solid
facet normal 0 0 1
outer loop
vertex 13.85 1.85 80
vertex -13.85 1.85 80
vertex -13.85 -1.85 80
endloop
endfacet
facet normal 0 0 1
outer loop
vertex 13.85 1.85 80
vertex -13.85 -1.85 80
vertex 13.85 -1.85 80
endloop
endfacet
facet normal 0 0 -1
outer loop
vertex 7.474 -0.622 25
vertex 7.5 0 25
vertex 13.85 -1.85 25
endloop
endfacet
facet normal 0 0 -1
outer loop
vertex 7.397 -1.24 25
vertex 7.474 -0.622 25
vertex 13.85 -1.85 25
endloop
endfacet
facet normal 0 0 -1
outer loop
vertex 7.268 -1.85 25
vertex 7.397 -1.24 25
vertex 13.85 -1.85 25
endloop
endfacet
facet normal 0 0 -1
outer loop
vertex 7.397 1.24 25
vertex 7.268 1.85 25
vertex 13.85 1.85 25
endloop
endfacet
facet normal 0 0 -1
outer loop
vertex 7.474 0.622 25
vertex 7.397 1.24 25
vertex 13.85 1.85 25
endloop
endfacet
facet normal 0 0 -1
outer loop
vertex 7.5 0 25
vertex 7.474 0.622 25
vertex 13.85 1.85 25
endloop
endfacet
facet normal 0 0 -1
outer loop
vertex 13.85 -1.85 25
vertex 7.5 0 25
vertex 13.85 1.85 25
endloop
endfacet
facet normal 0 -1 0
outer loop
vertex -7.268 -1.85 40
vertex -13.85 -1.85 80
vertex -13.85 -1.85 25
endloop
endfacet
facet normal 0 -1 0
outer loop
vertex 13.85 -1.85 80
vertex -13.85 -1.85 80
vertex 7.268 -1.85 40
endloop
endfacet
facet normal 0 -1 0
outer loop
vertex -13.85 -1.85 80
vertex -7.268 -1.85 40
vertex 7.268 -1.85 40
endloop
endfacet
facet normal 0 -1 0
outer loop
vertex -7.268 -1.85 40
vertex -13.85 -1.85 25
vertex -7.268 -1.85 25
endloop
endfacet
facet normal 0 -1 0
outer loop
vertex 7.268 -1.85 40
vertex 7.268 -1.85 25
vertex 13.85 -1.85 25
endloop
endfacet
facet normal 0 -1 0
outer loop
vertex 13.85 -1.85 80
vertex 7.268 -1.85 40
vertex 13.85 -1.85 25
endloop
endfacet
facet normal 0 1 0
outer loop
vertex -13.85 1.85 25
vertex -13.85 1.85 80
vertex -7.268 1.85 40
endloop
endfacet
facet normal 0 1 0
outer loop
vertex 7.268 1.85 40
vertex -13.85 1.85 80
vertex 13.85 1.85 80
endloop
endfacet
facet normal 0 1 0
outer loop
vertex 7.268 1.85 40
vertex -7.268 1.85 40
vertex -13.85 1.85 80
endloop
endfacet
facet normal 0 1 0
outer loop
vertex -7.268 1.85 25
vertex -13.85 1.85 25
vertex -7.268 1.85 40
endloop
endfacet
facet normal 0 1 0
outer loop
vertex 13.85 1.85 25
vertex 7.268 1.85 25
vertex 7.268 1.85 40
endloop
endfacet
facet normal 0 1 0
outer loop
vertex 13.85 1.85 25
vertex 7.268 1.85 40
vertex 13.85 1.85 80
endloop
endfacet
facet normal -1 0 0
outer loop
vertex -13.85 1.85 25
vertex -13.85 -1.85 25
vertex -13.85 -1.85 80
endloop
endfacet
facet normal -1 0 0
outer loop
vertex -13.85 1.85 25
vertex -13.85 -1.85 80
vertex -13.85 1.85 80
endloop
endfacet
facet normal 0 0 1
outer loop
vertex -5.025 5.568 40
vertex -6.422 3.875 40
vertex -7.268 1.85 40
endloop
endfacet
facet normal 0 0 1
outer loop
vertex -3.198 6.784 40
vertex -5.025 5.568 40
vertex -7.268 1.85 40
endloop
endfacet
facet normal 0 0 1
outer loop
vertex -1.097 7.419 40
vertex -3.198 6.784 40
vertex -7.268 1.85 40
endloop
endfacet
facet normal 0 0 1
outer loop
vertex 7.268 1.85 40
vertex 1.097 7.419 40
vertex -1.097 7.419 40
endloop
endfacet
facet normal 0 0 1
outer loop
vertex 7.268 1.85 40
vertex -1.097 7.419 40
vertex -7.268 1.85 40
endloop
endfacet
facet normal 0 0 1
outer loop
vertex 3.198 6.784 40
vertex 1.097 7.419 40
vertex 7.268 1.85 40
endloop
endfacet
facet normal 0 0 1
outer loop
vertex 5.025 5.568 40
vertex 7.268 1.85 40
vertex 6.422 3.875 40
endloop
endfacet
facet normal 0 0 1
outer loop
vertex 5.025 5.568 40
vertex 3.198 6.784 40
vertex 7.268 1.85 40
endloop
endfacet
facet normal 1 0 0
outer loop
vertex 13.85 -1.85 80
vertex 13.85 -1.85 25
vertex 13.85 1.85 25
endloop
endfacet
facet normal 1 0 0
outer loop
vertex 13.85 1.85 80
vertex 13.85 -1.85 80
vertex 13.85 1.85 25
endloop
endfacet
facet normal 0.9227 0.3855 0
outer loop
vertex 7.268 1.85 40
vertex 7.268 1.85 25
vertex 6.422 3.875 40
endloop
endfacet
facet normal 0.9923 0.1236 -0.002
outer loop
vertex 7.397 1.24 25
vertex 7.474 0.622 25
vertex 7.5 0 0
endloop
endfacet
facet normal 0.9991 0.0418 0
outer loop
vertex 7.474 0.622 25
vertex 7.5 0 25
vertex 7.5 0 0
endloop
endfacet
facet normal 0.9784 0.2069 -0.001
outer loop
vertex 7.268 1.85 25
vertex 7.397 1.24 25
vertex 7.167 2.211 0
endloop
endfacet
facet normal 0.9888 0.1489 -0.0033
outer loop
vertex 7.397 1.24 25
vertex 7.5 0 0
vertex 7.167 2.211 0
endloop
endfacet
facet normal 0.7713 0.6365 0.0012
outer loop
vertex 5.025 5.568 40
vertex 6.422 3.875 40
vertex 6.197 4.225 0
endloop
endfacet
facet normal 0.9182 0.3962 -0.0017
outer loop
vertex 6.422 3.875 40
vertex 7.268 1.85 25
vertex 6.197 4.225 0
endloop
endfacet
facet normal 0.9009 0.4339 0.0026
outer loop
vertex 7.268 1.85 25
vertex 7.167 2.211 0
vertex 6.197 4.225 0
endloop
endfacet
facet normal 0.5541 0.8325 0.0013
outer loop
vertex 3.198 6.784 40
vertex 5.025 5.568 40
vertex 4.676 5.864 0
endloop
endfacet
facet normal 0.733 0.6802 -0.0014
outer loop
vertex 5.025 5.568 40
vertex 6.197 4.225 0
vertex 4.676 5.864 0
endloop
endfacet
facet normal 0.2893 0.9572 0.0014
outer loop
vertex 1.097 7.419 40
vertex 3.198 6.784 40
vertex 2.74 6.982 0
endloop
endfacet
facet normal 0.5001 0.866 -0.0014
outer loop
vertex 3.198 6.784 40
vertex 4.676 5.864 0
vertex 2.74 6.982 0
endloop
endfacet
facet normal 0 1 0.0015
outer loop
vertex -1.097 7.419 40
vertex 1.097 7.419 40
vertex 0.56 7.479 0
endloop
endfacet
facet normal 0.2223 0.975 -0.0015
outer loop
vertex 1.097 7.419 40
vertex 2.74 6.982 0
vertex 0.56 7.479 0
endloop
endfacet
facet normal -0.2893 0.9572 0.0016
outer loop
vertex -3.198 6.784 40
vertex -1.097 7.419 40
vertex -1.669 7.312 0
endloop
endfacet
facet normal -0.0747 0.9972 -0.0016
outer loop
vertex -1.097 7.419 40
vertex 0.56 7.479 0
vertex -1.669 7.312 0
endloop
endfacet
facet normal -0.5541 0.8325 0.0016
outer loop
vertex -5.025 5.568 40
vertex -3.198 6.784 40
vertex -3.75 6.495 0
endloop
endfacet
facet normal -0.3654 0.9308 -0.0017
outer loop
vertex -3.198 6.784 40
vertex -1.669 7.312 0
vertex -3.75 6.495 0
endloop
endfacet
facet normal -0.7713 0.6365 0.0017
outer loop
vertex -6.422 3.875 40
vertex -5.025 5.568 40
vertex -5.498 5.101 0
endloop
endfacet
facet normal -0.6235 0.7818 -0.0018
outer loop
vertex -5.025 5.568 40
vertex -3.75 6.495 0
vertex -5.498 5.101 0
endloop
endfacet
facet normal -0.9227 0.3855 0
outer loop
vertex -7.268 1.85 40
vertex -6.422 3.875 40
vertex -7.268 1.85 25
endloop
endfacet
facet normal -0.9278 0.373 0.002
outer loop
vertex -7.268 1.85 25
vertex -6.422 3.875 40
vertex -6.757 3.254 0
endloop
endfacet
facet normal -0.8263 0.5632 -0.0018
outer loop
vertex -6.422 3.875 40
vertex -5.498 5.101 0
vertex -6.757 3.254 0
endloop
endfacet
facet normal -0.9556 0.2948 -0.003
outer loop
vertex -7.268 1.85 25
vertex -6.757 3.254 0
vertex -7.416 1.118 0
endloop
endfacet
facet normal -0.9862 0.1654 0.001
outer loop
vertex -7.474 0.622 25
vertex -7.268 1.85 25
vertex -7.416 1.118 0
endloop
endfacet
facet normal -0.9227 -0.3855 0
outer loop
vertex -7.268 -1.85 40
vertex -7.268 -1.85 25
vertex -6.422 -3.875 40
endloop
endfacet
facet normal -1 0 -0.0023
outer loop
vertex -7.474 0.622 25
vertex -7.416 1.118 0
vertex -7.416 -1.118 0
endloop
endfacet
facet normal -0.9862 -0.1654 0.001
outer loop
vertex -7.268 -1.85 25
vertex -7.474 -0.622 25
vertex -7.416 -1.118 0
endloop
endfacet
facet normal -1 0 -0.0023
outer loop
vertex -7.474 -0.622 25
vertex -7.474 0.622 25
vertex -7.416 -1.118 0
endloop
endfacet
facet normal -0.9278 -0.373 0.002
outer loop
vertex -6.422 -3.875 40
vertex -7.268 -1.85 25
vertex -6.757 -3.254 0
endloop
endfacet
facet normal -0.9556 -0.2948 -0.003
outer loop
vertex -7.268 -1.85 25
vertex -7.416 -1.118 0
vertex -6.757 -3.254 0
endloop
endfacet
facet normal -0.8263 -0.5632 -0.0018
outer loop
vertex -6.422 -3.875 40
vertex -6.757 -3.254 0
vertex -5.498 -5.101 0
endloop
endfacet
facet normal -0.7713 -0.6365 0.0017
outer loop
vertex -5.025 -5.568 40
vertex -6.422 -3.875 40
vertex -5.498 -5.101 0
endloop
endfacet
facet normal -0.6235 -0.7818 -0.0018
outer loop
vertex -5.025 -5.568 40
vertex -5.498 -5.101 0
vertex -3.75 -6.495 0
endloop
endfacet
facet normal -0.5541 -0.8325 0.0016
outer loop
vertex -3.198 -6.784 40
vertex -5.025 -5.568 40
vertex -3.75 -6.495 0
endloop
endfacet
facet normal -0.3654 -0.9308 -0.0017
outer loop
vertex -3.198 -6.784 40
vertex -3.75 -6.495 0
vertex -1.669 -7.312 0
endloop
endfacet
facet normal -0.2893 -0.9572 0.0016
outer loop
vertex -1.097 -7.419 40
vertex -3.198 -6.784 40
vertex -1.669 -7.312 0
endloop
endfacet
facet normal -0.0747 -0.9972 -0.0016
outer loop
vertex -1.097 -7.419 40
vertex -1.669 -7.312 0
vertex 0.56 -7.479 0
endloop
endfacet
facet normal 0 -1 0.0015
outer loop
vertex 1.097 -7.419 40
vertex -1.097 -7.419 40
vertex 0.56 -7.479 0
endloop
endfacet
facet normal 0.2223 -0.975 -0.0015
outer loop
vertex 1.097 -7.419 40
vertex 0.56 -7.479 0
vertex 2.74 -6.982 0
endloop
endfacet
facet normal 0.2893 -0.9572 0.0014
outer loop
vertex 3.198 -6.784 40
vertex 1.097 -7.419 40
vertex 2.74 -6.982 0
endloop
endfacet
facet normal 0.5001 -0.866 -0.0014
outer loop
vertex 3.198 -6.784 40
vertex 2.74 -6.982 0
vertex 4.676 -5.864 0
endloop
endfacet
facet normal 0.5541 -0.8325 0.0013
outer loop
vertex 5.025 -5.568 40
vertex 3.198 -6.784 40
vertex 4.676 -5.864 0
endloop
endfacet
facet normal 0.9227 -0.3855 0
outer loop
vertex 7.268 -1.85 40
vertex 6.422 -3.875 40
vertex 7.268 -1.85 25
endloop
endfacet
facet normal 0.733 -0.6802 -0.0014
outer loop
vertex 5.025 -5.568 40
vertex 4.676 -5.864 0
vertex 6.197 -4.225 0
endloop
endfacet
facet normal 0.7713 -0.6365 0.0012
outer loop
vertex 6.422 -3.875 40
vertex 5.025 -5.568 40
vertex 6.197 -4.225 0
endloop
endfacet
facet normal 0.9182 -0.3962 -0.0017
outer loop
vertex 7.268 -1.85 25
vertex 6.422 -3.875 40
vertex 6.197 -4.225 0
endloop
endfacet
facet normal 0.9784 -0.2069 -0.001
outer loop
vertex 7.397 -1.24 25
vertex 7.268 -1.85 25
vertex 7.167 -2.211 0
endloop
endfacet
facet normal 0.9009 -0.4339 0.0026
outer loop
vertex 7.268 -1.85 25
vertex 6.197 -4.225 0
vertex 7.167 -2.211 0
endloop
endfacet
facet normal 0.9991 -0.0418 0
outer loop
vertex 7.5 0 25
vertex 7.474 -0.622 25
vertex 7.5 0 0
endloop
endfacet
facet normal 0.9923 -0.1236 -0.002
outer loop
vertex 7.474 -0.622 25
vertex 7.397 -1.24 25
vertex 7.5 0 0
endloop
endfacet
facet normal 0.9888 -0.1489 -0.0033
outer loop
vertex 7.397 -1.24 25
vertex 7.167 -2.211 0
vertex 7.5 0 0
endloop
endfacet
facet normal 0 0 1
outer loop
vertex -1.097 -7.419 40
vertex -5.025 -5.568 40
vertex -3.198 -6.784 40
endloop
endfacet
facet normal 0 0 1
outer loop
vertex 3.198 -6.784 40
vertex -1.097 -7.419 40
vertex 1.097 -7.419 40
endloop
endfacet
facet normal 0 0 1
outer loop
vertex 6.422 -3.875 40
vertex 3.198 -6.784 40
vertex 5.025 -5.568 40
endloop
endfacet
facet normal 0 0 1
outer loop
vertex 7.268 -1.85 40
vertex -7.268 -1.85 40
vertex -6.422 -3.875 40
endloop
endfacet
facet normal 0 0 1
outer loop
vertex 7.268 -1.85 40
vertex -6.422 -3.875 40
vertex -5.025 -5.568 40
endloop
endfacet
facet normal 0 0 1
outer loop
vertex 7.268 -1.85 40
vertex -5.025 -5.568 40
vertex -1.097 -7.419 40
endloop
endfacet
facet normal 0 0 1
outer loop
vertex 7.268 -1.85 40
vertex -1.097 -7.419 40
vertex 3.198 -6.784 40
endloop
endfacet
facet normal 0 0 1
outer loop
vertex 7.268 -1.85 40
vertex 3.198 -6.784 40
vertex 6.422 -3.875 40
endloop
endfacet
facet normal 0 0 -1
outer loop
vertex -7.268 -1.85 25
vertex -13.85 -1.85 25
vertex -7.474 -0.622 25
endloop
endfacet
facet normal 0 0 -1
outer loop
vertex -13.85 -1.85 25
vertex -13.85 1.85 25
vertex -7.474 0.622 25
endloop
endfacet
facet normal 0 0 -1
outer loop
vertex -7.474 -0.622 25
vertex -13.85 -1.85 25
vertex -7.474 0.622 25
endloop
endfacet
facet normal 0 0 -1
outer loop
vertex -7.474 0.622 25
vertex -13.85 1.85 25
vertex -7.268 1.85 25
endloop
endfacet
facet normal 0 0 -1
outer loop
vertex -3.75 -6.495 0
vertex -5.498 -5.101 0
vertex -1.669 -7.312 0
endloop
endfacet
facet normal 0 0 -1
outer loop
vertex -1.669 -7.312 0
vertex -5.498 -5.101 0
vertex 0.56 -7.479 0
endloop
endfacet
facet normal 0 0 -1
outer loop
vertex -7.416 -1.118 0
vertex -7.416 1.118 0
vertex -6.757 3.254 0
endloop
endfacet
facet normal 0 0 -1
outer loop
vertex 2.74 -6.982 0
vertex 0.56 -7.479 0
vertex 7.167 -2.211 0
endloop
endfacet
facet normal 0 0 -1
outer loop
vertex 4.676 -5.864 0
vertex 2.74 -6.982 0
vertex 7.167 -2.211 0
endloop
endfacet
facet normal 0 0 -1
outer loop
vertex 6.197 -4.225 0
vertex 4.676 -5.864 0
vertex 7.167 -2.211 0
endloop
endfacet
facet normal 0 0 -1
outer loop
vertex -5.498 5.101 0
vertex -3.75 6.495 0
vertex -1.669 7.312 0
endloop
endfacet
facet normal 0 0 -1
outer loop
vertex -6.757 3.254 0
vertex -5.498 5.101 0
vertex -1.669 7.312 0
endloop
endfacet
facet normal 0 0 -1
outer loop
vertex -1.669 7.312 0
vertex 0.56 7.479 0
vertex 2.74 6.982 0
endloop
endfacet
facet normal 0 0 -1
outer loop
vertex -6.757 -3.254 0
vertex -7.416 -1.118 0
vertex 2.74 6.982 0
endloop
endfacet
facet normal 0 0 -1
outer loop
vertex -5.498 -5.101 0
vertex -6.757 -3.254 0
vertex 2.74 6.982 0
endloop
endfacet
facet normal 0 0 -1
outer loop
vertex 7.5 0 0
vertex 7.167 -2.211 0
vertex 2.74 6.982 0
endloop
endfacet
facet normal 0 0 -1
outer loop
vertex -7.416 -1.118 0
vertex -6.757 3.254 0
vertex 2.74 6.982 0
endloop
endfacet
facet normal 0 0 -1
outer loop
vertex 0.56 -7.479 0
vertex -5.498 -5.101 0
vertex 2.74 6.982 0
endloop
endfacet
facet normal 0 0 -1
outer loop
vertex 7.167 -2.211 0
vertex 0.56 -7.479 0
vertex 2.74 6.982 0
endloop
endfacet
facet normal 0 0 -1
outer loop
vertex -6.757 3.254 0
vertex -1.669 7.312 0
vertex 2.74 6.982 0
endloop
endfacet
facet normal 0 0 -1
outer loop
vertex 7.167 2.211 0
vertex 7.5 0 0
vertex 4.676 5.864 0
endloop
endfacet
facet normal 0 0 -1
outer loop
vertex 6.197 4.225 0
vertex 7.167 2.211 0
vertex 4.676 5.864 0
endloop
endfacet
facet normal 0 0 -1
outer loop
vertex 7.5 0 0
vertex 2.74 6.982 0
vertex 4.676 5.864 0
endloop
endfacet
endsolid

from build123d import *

# Parameters (mm, degrees)
SKETCH5_R           = 7.5
BOSS_EXTRUDE3_DEPTH = 40
SKETCH10_W          = 27.7
SKETCH10_H          = 3.7
CUT_EXTRUDE2_DEPTH  = 15
SKETCH11_W          = 27.7
SKETCH11_H          = 3.7
BOSS_EXTRUDE5_DEPTH = 55


with BuildPart() as part:
    # Sketch5 → Boss-Extrude3 (new body)
    with BuildSketch(Plane.XY):
        Circle(SKETCH5_R)
    extrude(amount=BOSS_EXTRUDE3_DEPTH)

    # Sketch10 → Cut-Extrude2 (cut)
    with BuildSketch(Plane.XY.offset(40)):
        Rectangle(SKETCH10_W, SKETCH10_H)
    extrude(amount=-CUT_EXTRUDE2_DEPTH, mode=Mode.SUBTRACT)

    # Sketch11 → Boss-Extrude5 (add)
    with BuildSketch(Plane.XY.offset(25)):
        Rectangle(SKETCH11_W, SKETCH11_H)
    extrude(amount=BOSS_EXTRUDE5_DEPTH)


solid = part.part
